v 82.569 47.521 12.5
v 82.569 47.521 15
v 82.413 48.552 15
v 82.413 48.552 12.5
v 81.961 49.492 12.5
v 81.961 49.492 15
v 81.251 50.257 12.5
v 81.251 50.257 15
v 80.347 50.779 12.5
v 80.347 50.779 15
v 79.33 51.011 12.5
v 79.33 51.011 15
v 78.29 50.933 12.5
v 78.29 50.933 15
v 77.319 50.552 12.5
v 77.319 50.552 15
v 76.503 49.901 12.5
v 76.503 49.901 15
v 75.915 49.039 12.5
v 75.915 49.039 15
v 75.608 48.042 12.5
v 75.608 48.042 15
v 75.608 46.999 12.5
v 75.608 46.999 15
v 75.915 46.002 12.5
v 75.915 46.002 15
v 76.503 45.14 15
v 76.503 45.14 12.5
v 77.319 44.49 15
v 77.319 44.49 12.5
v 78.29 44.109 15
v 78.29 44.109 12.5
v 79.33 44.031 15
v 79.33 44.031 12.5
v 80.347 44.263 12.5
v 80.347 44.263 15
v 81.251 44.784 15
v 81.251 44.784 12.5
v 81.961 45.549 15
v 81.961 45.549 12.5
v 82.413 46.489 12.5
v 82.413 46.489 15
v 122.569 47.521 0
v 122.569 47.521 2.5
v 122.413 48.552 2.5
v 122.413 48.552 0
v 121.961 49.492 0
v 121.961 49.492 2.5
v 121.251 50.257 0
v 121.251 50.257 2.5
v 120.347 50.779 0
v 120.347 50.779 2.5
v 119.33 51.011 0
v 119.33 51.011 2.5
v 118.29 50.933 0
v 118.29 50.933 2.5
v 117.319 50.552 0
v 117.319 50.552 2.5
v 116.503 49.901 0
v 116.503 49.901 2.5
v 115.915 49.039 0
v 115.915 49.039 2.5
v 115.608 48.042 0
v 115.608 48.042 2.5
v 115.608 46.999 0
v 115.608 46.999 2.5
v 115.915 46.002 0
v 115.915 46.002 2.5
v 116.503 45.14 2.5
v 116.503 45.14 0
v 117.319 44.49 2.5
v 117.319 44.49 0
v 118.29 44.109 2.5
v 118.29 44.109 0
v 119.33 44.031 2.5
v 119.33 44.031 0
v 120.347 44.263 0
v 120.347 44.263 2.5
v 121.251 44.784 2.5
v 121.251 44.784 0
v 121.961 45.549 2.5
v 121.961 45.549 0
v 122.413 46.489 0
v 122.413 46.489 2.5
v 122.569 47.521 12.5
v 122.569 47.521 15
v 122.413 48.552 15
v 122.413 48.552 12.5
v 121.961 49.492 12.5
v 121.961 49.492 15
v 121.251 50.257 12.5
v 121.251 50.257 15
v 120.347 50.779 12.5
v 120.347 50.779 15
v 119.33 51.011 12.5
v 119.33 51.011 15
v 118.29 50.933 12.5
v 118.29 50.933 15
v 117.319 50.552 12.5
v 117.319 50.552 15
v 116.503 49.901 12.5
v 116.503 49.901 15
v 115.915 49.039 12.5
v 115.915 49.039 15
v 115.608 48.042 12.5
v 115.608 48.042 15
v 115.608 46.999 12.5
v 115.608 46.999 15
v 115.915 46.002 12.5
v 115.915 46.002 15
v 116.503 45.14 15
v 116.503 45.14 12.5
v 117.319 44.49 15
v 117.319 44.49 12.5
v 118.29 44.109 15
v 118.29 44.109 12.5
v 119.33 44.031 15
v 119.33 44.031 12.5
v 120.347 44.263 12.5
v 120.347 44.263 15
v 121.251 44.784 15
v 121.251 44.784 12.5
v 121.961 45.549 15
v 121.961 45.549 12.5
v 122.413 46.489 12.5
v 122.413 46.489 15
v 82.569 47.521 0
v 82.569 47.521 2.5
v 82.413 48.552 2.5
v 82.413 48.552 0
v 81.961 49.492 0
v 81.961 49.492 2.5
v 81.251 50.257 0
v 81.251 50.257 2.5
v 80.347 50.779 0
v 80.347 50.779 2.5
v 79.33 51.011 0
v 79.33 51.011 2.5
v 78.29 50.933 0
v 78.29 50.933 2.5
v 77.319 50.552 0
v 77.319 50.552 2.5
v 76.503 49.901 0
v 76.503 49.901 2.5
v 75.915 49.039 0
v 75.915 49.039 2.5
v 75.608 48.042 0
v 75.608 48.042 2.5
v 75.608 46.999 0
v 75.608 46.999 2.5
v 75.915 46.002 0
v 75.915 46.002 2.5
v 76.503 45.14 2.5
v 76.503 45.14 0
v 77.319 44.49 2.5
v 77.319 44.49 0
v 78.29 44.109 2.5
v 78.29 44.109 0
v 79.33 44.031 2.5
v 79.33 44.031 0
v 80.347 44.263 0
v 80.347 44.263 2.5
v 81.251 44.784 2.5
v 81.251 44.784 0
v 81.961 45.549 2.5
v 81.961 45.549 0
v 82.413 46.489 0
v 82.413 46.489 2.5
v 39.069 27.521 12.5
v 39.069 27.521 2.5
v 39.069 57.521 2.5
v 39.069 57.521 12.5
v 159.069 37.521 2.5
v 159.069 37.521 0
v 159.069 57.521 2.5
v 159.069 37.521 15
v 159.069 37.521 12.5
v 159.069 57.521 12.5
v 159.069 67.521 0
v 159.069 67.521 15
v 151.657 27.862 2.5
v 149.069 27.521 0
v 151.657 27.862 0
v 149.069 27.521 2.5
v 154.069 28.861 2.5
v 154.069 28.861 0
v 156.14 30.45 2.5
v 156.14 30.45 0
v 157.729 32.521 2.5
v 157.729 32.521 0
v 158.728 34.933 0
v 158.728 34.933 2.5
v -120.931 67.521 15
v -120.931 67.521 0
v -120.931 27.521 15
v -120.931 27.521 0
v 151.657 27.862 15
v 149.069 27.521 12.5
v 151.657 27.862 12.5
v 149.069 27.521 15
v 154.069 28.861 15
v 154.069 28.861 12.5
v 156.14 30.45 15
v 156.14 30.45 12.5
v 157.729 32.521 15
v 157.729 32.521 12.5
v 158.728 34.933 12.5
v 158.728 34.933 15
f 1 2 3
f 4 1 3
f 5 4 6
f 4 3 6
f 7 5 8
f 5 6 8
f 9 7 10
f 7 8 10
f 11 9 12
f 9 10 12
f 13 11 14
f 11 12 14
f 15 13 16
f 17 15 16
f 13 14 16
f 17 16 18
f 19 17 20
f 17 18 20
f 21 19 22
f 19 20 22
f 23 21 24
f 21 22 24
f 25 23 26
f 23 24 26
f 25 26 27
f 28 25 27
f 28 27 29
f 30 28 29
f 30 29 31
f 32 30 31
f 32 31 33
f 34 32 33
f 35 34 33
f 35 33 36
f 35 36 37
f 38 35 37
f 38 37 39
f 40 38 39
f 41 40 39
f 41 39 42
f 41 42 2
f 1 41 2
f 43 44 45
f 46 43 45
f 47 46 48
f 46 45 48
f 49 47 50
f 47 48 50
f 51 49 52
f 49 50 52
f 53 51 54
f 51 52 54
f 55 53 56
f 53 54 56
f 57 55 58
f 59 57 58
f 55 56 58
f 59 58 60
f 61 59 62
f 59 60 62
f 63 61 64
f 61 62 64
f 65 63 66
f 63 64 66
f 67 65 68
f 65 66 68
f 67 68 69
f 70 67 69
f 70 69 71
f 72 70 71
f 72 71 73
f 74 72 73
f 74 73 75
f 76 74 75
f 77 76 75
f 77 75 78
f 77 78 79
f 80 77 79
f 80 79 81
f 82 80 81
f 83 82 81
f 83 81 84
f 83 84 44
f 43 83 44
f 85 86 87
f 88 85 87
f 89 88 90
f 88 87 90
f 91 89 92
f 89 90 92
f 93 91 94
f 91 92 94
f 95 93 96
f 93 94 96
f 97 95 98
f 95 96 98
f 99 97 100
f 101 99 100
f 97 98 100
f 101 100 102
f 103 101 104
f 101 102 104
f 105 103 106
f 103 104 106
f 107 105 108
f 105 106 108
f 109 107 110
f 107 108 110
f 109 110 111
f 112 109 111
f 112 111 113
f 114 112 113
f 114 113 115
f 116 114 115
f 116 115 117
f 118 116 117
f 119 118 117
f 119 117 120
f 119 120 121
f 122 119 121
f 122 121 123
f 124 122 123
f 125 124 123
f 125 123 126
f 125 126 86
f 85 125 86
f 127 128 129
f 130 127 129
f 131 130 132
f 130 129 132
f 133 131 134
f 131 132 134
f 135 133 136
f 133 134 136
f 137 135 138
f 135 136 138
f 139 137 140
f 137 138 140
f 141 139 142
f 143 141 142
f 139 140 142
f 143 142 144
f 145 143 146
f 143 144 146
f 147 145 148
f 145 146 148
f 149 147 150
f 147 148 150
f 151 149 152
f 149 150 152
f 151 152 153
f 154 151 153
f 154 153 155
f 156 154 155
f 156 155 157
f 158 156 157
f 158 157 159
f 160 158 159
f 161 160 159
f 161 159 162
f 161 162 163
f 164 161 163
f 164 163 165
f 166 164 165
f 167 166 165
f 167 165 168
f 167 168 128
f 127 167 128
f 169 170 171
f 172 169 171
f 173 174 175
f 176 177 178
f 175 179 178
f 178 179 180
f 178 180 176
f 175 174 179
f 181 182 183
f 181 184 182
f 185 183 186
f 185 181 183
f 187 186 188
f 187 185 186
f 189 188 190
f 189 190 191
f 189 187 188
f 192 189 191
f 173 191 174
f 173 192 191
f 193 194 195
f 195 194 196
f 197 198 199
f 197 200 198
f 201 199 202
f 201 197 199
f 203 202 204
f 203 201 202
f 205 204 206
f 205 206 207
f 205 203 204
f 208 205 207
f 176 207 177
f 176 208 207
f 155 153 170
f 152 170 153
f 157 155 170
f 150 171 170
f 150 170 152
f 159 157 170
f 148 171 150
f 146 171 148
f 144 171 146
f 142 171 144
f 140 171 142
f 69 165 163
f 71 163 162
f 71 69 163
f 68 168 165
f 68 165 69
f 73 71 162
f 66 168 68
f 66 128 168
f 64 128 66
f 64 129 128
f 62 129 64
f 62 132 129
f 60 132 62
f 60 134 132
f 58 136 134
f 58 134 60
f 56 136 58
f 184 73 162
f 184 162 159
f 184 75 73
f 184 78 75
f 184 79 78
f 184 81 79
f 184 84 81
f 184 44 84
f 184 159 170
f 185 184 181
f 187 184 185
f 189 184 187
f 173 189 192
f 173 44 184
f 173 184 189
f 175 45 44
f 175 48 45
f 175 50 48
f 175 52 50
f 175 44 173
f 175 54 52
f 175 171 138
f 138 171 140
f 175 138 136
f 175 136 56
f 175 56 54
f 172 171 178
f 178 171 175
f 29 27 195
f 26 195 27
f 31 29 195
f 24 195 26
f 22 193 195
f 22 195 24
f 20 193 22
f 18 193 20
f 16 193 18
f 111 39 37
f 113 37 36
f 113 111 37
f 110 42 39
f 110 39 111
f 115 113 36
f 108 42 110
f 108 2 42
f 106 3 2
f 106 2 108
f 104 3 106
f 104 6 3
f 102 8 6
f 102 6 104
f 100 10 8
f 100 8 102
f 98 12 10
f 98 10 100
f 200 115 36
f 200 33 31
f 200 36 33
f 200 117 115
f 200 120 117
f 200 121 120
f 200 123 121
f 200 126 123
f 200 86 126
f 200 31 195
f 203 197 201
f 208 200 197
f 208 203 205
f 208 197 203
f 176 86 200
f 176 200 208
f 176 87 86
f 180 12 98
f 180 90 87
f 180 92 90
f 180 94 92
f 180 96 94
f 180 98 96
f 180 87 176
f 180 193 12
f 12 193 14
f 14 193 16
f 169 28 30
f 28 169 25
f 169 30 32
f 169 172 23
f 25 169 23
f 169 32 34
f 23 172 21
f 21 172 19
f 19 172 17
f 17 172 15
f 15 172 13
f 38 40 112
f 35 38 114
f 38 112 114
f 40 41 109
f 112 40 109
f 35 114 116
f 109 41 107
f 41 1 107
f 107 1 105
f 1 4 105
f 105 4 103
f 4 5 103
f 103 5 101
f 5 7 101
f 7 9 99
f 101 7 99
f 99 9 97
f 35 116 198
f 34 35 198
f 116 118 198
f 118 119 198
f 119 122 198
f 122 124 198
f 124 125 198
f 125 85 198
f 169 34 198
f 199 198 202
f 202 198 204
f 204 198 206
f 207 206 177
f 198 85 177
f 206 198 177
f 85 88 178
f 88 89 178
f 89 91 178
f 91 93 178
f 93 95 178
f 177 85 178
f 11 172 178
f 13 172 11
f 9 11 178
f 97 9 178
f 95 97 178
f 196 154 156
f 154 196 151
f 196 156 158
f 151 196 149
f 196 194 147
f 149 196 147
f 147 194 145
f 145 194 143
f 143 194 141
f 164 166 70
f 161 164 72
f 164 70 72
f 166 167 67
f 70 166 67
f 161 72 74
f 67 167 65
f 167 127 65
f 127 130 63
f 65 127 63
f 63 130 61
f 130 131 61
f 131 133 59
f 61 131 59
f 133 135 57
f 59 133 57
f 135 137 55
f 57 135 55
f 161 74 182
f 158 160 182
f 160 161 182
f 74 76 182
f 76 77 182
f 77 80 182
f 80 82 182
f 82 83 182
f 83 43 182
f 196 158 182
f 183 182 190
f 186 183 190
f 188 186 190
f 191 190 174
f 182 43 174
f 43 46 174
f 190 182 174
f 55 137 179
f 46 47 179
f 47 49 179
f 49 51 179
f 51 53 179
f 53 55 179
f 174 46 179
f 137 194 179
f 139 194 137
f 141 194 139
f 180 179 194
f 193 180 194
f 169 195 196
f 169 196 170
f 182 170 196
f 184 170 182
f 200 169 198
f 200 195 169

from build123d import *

# Parameters (mm, degrees)
F1_DEPTH = 15
F0_W     = 120
F0_H     = 30
F2_DEPTH = 2.5
F3_W     = 120
F3_H     = 2.5
F4_DEPTH = 30
F5_R     = 10
F6_R     = 3.5
F7_DEPTH = 25


with BuildPart() as f1:
    # F0 (on Top) → F1 (new body)
    with BuildSketch(Plane.XY):
        Polygon((159.068721, 67.520804), (-120.931279, 67.520804), (-120.931279, 27.520804), (39.068721, 27.520804), (39.068721, 57.520804), (159.068721, 57.520804), align=None)
    extrude(amount=F1_DEPTH)

    # F0 (on Top) → F2 (join)
    with BuildSketch(Plane.XY):
        with Locations((99.068721, 42.520804)):
            Rectangle(F0_W, F0_H)
    extrude(amount=F2_DEPTH)

    # F3 (on face) → F4 (join)
    with BuildSketch(Plane.XZ.offset(-57.520804)):
        with Locations((99.068721, 13.75)):
            Rectangle(F3_W, F3_H)
    extrude(amount=F4_DEPTH)

    # F5
    f5_edges = [f1.edges().sort_by_distance(p)[0] for p in [
        (159.068721, 27.520804, 13.75),
        (159.068721, 27.520804, 1.25),
    ]]
    fillet(f5_edges, radius=F5_R)

    # F6 (on face) → F7 (cut)
    with BuildSketch(Plane.XY.offset(15)):
        with Locations((79.068721, 47.520804)):
            Circle(F6_R)
        with Locations((119.068721, 47.520804)):
            Circle(F6_R)
    extrude(amount=-F7_DEPTH, mode=Mode.SUBTRACT)


solid = f1.part
